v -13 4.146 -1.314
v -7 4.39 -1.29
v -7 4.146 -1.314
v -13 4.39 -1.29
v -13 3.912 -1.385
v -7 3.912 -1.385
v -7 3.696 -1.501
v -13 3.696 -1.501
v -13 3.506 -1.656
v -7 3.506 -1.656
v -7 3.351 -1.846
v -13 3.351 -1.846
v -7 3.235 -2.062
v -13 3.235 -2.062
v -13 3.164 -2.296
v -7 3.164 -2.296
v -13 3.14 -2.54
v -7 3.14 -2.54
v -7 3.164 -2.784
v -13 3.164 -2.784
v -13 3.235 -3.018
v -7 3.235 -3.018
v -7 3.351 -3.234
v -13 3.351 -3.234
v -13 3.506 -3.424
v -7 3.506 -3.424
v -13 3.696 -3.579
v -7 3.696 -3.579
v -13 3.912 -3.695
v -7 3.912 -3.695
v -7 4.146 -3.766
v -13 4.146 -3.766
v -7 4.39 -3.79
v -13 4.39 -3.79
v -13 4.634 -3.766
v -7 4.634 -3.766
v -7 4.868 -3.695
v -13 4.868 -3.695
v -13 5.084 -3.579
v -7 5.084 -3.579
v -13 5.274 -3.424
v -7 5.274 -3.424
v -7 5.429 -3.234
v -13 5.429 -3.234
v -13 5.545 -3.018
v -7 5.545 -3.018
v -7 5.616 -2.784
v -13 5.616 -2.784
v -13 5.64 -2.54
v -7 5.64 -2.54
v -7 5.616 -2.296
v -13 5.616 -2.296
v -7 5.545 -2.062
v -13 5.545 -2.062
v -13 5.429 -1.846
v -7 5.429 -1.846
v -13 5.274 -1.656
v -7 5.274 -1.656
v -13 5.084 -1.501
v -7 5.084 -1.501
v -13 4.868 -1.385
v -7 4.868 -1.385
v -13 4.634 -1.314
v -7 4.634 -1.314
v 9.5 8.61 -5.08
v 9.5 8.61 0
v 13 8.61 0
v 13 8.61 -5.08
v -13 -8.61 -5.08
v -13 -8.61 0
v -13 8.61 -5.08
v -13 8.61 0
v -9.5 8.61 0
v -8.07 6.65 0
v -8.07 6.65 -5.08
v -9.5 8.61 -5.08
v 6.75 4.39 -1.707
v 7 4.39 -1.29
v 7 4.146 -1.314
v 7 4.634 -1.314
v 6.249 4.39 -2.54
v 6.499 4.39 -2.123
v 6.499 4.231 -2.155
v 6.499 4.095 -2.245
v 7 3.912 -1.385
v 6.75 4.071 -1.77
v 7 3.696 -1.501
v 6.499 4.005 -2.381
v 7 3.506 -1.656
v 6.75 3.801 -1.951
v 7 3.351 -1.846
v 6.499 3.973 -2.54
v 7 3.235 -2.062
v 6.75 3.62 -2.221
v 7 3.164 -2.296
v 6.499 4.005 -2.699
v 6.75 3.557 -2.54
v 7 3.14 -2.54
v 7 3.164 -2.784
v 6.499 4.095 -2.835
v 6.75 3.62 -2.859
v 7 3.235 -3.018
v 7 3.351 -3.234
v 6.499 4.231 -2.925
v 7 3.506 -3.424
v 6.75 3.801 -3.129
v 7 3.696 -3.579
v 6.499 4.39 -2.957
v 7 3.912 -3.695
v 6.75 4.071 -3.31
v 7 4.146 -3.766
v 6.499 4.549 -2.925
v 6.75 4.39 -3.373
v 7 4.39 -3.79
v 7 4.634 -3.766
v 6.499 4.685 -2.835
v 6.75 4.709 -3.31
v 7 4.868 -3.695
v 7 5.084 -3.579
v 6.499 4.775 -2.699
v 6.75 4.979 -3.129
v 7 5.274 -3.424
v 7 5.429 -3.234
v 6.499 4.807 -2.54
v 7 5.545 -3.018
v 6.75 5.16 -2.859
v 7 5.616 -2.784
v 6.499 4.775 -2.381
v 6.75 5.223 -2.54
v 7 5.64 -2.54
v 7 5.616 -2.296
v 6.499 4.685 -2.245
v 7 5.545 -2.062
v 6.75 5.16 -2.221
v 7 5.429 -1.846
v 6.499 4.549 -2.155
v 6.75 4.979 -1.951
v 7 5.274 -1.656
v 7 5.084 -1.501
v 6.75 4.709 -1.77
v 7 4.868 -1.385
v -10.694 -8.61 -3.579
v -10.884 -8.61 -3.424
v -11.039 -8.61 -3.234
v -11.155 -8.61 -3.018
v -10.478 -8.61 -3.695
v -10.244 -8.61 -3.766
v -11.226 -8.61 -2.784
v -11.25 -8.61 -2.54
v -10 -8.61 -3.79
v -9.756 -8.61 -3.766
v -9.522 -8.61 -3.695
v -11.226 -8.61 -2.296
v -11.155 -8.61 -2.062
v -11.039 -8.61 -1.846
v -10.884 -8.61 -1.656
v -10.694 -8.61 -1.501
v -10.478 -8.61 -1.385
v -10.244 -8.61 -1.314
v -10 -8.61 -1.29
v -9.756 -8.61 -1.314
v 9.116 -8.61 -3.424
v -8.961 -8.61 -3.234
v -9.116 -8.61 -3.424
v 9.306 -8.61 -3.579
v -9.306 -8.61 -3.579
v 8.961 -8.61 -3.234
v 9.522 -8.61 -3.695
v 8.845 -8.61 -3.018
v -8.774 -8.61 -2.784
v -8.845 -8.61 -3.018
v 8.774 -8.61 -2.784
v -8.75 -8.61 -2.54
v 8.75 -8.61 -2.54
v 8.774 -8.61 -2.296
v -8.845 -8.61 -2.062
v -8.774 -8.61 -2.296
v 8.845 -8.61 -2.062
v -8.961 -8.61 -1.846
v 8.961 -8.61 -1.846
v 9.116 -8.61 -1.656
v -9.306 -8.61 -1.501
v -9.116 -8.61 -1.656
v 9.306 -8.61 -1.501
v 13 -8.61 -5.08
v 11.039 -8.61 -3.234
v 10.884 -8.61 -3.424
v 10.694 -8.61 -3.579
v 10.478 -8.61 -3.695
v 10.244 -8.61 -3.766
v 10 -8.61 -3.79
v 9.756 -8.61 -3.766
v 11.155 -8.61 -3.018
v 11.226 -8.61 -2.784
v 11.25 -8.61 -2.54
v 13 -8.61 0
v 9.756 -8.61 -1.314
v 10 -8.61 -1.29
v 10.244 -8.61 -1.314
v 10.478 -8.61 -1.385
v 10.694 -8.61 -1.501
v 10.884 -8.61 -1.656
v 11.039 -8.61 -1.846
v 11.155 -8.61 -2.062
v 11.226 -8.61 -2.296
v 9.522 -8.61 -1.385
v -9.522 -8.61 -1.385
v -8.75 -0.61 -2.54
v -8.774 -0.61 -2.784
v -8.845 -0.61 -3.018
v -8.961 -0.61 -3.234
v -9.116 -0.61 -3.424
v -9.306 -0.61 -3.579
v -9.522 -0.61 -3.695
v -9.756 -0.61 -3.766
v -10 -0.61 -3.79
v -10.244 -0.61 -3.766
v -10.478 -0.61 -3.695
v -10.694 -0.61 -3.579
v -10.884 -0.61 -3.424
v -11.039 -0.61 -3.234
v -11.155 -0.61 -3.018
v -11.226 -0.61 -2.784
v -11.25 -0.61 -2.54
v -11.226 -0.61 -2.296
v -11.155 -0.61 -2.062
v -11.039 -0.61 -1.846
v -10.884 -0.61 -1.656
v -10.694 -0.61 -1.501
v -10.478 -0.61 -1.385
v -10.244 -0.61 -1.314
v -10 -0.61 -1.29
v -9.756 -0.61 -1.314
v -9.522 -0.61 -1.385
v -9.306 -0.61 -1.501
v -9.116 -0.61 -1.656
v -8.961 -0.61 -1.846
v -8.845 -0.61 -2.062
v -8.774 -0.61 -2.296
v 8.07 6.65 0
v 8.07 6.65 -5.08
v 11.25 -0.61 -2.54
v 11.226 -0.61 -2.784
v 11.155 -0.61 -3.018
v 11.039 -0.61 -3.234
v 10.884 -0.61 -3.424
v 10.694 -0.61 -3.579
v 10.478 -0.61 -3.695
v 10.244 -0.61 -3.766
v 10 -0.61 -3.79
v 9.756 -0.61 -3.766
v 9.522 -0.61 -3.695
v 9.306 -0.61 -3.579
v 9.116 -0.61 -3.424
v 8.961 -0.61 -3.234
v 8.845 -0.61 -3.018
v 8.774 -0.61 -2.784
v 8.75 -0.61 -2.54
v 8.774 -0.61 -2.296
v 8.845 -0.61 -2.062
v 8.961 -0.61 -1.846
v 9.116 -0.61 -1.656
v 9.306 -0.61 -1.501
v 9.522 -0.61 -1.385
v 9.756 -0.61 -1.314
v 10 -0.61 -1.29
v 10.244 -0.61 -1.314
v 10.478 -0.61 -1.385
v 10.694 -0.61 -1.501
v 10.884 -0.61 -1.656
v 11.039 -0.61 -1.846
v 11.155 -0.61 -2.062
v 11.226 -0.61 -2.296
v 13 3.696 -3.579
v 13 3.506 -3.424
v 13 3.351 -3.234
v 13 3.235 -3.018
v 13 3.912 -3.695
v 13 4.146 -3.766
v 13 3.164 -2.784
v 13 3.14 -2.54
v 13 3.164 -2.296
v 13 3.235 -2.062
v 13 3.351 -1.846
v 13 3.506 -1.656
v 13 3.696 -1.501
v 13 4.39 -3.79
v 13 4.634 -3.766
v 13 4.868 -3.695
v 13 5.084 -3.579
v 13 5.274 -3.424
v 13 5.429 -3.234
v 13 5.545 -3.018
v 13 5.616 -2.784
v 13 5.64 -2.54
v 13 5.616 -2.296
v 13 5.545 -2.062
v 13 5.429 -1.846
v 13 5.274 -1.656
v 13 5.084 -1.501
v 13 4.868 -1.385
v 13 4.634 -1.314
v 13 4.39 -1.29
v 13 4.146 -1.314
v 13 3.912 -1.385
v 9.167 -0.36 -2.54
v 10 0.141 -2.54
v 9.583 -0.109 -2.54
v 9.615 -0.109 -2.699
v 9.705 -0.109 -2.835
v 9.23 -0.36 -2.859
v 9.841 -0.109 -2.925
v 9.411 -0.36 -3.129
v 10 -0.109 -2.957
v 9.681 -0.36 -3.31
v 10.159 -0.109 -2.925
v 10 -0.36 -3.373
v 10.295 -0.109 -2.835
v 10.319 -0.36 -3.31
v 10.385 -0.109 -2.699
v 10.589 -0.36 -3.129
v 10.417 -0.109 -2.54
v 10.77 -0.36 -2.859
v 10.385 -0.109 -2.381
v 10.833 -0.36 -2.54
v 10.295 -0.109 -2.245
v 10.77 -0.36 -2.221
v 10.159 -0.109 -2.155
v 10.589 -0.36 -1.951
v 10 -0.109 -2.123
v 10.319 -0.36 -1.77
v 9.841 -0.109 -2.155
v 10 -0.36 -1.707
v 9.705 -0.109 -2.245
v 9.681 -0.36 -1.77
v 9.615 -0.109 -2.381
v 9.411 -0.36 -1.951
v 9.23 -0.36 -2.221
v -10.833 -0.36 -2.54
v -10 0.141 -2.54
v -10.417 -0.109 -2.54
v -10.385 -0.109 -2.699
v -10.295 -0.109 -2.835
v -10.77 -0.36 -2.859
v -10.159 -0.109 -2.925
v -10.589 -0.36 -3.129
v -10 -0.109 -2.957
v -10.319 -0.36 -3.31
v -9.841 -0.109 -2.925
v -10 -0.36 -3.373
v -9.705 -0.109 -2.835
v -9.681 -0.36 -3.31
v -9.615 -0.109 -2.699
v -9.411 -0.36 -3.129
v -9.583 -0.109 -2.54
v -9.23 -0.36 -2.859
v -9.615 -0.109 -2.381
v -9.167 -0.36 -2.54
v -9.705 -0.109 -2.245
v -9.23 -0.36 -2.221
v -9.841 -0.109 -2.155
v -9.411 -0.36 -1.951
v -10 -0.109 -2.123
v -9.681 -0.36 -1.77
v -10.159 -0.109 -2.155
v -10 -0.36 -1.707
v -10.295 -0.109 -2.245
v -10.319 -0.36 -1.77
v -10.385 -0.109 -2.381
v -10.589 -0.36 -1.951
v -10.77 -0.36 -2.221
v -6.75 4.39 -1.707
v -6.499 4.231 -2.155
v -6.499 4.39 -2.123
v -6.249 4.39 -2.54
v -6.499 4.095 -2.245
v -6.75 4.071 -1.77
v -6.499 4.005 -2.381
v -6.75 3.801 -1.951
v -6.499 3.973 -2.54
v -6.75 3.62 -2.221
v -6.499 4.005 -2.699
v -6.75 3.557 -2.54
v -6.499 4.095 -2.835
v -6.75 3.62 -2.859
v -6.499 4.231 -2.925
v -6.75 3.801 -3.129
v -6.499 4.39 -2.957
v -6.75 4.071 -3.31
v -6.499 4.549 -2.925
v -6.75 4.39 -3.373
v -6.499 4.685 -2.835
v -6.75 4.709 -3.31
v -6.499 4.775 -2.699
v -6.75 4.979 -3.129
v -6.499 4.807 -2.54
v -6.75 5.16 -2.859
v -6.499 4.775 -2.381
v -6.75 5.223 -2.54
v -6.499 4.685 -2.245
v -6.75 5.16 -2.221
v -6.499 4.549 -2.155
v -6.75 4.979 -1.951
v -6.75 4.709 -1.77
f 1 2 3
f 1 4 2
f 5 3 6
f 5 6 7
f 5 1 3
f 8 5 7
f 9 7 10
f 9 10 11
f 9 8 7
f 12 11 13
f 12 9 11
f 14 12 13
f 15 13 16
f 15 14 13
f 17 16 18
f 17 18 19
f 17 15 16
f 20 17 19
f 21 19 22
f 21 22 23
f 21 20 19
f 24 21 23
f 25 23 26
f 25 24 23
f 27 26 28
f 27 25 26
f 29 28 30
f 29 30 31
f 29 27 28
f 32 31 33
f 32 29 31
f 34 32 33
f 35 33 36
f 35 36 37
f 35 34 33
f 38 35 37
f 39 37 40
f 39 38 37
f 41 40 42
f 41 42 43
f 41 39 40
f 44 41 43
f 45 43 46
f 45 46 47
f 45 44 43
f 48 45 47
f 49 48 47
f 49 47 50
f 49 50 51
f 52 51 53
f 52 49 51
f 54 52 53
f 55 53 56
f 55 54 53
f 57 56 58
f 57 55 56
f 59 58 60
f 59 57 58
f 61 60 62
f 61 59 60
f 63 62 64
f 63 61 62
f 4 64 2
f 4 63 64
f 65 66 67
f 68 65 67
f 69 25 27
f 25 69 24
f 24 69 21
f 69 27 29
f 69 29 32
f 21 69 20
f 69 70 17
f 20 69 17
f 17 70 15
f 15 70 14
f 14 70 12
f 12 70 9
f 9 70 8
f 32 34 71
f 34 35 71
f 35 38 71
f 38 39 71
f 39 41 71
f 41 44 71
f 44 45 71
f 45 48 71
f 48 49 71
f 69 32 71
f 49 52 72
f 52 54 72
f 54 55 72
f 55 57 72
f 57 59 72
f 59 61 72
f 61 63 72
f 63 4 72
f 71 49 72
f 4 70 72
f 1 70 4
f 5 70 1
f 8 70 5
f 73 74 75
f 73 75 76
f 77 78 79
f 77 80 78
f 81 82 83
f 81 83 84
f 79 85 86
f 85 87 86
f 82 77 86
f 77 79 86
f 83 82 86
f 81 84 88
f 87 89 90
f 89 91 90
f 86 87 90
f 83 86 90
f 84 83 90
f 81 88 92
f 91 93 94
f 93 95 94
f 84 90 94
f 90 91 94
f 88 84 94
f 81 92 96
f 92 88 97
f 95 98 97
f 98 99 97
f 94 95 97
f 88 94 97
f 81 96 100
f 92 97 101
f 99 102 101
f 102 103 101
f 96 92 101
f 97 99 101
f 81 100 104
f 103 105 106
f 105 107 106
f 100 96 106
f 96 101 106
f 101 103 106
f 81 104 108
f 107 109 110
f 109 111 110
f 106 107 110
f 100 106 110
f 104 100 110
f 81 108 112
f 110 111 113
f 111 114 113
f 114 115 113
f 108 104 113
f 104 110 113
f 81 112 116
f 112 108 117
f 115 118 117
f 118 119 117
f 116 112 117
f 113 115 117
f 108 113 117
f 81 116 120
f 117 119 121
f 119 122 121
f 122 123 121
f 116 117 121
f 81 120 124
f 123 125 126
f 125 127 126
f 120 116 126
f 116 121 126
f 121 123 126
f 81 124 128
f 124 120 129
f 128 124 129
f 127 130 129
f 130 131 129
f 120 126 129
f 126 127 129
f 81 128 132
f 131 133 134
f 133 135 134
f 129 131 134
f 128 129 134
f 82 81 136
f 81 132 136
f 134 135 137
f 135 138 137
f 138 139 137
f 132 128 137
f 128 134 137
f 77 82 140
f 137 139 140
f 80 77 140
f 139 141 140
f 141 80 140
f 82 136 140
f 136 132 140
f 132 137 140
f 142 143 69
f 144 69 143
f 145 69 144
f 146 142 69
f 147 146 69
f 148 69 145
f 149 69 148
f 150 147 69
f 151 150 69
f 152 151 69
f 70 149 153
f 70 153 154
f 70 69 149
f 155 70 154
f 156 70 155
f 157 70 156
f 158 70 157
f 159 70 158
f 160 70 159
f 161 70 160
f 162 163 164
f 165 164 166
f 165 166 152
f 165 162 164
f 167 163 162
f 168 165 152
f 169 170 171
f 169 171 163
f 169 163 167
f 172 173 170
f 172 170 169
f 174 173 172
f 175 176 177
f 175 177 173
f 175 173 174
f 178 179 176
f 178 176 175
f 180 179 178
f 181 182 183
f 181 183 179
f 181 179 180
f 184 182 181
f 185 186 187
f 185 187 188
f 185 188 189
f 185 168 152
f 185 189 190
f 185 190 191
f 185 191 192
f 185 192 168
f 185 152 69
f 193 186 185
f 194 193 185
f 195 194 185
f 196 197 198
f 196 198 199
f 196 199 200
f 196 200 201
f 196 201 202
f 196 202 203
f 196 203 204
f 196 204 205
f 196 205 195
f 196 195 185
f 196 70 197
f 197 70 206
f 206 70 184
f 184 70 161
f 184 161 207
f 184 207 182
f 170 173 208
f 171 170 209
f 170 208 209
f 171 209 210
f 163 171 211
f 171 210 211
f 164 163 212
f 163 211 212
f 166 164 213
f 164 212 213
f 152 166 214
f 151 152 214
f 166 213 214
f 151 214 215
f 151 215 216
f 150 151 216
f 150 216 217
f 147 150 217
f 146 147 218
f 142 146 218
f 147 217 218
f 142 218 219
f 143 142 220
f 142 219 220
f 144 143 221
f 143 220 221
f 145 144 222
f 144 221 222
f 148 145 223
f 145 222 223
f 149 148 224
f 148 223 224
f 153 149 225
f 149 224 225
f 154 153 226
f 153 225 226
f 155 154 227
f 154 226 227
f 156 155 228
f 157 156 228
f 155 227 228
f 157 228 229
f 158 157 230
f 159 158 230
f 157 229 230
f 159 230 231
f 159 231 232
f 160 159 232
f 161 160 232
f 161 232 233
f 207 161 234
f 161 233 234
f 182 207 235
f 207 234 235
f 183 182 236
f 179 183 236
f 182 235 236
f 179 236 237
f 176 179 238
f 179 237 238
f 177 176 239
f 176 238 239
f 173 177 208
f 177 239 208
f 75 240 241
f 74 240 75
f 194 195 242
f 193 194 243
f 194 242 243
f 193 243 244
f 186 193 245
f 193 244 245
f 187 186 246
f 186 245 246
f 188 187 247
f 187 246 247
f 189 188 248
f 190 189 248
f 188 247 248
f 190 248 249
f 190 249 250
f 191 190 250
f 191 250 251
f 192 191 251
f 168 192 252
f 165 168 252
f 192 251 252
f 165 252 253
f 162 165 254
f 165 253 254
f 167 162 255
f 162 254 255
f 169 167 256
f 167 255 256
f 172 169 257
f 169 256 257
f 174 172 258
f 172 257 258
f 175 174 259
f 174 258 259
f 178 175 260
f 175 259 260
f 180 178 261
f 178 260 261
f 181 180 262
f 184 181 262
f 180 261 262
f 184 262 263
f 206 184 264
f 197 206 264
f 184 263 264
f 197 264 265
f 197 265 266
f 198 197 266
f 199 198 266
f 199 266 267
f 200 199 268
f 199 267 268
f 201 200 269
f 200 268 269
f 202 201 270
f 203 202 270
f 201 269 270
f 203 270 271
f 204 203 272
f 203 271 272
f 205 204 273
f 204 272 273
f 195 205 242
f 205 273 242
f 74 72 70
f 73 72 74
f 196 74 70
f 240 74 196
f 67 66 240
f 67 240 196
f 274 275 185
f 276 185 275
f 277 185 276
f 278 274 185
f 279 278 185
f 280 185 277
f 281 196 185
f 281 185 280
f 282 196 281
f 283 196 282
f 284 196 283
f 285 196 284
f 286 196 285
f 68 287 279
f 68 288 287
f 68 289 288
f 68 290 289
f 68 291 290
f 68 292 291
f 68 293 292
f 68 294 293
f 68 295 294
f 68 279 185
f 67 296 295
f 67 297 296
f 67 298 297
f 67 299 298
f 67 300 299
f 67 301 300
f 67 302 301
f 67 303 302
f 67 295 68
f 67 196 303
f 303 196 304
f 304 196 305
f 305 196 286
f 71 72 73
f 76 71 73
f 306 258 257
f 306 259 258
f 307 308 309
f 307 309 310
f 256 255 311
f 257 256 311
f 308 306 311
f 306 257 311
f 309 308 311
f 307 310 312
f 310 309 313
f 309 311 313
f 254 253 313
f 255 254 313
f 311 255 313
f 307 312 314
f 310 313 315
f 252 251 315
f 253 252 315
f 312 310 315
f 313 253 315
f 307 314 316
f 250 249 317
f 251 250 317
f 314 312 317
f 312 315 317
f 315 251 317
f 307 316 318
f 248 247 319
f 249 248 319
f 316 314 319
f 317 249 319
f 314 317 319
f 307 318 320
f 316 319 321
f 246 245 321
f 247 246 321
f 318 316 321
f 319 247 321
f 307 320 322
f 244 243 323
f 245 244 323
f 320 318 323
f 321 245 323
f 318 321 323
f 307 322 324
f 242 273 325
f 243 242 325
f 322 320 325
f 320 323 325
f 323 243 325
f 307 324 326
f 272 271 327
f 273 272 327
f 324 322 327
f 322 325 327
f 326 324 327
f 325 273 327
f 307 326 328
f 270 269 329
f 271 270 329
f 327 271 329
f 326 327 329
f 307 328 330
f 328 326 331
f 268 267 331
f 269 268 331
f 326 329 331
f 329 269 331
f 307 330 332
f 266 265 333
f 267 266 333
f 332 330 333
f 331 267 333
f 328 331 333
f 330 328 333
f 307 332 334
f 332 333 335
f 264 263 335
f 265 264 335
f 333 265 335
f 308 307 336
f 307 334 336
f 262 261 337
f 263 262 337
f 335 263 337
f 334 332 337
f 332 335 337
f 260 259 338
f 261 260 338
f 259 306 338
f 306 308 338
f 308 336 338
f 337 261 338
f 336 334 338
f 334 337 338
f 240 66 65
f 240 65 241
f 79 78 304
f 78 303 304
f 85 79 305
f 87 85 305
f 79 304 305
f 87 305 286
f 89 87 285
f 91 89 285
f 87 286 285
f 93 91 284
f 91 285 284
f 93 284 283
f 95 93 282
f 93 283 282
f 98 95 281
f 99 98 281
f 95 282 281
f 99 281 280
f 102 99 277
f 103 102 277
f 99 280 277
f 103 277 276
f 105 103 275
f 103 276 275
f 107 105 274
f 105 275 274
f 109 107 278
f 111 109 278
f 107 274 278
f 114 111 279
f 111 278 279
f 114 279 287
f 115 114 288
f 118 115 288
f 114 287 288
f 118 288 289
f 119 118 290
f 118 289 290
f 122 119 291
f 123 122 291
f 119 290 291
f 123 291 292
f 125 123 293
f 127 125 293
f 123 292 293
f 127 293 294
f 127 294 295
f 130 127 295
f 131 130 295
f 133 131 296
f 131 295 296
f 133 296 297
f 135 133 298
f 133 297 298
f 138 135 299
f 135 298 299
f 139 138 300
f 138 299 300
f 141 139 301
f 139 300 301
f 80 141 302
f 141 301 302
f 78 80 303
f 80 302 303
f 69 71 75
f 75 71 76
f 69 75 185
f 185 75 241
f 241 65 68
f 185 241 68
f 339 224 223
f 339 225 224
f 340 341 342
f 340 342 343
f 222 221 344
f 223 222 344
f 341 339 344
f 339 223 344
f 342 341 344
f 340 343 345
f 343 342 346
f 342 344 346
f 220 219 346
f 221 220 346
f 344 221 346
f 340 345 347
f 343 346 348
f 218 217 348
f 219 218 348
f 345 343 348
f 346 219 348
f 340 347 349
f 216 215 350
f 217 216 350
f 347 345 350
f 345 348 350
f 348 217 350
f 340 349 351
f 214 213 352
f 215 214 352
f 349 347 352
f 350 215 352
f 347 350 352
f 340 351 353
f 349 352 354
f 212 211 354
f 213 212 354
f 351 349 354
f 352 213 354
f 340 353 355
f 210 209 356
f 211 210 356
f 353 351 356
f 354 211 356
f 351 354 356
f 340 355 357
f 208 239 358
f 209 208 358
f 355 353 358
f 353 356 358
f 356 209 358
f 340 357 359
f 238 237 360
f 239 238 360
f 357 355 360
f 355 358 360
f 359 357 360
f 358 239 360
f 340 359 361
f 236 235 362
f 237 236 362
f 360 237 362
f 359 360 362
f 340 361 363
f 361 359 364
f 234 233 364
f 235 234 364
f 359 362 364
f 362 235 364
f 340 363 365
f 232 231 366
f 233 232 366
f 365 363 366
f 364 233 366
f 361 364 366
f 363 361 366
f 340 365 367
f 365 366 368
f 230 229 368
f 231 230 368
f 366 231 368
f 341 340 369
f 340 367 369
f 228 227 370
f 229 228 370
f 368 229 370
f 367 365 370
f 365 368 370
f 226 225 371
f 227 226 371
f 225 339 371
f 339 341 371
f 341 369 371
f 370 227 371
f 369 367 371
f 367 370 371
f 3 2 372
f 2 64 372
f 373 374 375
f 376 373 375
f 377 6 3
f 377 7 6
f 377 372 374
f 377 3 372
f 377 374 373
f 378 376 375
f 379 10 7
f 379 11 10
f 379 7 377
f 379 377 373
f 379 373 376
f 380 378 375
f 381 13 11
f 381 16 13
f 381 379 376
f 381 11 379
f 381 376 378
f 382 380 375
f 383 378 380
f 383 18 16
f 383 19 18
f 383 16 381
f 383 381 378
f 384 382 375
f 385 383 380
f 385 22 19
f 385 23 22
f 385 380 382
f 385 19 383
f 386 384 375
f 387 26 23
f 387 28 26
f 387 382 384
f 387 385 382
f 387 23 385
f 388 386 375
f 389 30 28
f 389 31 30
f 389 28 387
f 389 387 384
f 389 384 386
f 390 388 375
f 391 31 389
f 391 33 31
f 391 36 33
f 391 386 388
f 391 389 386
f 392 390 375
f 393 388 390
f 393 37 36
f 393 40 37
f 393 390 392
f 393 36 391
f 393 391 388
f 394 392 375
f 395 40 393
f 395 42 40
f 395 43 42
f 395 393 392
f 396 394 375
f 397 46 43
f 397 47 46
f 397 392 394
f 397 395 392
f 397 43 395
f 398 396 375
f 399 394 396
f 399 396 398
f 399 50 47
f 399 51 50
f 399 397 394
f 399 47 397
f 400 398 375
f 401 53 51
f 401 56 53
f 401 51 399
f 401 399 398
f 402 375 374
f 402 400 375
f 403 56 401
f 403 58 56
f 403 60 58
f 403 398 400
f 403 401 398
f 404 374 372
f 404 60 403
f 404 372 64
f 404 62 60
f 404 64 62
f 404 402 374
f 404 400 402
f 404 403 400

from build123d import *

# Parameters (mm, degrees)
SCHIZZO1_W                    = 26
SCHIZZO1_H                    = 17.22
ESTRUSIONE_ESTRUSIONE1_DEPTH  = 5.08
TAGLIO_ESTRUSIONE1_DEPTH      = 17.399344499
FORO_FILETTATO_M3X0_5_1_D     = 2.5
FORO_FILETTATO_M3X0_5_1_DEPTH = 8
FORO_FILETTATO_M3X0_5_1_TIP   = 0.751075774


with BuildPart() as part:
    # Schizzo1 → Estrusione-Estrusione1 (new body)
    with BuildSketch(Plane.XY):
        Rectangle(SCHIZZO1_W, SCHIZZO1_H)
    extrude(amount=-ESTRUSIONE_ESTRUSIONE1_DEPTH)

    # Schizzo2 → Taglio-Estrusione1 (cut, through all)
    with BuildSketch(Plane.XY):
        Polygon((-9.5, 8.61), (9.5, 8.61), (8.07, 6.65), (-8.07, 6.65), align=None)
    extrude(amount=-TAGLIO_ESTRUSIONE1_DEPTH, mode=Mode.SUBTRACT)

    # Foro filettato M3x0.5-1
    with Locations(Plane(origin=(0, -8.61, 0), x_dir=(-1, 0, 0), z_dir=(0, -1, 0))):
        with Locations((10, 2.54), (-10, 2.54)):
            Hole(FORO_FILETTATO_M3X0_5_1_D / 2, depth=FORO_FILETTATO_M3X0_5_1_DEPTH)
            with Locations((0, 0, -(FORO_FILETTATO_M3X0_5_1_DEPTH + FORO_FILETTATO_M3X0_5_1_TIP / 2))):  # 118° drill point
                Cone(0, FORO_FILETTATO_M3X0_5_1_D / 2, FORO_FILETTATO_M3X0_5_1_TIP, mode=Mode.SUBTRACT)

    # Schizzo5 → Foro filettato M3x0.5-2 (revolve, cut)
    with BuildSketch(Plane(origin=(-13, 4.39, -2.54), x_dir=(0, 0, 1), z_dir=(0, 1, 0))):
        Polygon((0, 0), (0, 6.751075774), (1.25, 6), (1.25, 0), align=None)
    foro_filettato_m3x0_5_2 = revolve(axis=Axis((-19.35, 4.39, -2.54), (1, 0, 0)), mode=Mode.SUBTRACT)

    # Specchia1: Foro filettato M3x0.5-2 across plane
    add(foro_filettato_m3x0_5_2.mirror(Plane(origin=(0, 0, 0), x_dir=(0, 0, 1), z_dir=(1, 0, 0))), mode=Mode.SUBTRACT)


solid = part.part
